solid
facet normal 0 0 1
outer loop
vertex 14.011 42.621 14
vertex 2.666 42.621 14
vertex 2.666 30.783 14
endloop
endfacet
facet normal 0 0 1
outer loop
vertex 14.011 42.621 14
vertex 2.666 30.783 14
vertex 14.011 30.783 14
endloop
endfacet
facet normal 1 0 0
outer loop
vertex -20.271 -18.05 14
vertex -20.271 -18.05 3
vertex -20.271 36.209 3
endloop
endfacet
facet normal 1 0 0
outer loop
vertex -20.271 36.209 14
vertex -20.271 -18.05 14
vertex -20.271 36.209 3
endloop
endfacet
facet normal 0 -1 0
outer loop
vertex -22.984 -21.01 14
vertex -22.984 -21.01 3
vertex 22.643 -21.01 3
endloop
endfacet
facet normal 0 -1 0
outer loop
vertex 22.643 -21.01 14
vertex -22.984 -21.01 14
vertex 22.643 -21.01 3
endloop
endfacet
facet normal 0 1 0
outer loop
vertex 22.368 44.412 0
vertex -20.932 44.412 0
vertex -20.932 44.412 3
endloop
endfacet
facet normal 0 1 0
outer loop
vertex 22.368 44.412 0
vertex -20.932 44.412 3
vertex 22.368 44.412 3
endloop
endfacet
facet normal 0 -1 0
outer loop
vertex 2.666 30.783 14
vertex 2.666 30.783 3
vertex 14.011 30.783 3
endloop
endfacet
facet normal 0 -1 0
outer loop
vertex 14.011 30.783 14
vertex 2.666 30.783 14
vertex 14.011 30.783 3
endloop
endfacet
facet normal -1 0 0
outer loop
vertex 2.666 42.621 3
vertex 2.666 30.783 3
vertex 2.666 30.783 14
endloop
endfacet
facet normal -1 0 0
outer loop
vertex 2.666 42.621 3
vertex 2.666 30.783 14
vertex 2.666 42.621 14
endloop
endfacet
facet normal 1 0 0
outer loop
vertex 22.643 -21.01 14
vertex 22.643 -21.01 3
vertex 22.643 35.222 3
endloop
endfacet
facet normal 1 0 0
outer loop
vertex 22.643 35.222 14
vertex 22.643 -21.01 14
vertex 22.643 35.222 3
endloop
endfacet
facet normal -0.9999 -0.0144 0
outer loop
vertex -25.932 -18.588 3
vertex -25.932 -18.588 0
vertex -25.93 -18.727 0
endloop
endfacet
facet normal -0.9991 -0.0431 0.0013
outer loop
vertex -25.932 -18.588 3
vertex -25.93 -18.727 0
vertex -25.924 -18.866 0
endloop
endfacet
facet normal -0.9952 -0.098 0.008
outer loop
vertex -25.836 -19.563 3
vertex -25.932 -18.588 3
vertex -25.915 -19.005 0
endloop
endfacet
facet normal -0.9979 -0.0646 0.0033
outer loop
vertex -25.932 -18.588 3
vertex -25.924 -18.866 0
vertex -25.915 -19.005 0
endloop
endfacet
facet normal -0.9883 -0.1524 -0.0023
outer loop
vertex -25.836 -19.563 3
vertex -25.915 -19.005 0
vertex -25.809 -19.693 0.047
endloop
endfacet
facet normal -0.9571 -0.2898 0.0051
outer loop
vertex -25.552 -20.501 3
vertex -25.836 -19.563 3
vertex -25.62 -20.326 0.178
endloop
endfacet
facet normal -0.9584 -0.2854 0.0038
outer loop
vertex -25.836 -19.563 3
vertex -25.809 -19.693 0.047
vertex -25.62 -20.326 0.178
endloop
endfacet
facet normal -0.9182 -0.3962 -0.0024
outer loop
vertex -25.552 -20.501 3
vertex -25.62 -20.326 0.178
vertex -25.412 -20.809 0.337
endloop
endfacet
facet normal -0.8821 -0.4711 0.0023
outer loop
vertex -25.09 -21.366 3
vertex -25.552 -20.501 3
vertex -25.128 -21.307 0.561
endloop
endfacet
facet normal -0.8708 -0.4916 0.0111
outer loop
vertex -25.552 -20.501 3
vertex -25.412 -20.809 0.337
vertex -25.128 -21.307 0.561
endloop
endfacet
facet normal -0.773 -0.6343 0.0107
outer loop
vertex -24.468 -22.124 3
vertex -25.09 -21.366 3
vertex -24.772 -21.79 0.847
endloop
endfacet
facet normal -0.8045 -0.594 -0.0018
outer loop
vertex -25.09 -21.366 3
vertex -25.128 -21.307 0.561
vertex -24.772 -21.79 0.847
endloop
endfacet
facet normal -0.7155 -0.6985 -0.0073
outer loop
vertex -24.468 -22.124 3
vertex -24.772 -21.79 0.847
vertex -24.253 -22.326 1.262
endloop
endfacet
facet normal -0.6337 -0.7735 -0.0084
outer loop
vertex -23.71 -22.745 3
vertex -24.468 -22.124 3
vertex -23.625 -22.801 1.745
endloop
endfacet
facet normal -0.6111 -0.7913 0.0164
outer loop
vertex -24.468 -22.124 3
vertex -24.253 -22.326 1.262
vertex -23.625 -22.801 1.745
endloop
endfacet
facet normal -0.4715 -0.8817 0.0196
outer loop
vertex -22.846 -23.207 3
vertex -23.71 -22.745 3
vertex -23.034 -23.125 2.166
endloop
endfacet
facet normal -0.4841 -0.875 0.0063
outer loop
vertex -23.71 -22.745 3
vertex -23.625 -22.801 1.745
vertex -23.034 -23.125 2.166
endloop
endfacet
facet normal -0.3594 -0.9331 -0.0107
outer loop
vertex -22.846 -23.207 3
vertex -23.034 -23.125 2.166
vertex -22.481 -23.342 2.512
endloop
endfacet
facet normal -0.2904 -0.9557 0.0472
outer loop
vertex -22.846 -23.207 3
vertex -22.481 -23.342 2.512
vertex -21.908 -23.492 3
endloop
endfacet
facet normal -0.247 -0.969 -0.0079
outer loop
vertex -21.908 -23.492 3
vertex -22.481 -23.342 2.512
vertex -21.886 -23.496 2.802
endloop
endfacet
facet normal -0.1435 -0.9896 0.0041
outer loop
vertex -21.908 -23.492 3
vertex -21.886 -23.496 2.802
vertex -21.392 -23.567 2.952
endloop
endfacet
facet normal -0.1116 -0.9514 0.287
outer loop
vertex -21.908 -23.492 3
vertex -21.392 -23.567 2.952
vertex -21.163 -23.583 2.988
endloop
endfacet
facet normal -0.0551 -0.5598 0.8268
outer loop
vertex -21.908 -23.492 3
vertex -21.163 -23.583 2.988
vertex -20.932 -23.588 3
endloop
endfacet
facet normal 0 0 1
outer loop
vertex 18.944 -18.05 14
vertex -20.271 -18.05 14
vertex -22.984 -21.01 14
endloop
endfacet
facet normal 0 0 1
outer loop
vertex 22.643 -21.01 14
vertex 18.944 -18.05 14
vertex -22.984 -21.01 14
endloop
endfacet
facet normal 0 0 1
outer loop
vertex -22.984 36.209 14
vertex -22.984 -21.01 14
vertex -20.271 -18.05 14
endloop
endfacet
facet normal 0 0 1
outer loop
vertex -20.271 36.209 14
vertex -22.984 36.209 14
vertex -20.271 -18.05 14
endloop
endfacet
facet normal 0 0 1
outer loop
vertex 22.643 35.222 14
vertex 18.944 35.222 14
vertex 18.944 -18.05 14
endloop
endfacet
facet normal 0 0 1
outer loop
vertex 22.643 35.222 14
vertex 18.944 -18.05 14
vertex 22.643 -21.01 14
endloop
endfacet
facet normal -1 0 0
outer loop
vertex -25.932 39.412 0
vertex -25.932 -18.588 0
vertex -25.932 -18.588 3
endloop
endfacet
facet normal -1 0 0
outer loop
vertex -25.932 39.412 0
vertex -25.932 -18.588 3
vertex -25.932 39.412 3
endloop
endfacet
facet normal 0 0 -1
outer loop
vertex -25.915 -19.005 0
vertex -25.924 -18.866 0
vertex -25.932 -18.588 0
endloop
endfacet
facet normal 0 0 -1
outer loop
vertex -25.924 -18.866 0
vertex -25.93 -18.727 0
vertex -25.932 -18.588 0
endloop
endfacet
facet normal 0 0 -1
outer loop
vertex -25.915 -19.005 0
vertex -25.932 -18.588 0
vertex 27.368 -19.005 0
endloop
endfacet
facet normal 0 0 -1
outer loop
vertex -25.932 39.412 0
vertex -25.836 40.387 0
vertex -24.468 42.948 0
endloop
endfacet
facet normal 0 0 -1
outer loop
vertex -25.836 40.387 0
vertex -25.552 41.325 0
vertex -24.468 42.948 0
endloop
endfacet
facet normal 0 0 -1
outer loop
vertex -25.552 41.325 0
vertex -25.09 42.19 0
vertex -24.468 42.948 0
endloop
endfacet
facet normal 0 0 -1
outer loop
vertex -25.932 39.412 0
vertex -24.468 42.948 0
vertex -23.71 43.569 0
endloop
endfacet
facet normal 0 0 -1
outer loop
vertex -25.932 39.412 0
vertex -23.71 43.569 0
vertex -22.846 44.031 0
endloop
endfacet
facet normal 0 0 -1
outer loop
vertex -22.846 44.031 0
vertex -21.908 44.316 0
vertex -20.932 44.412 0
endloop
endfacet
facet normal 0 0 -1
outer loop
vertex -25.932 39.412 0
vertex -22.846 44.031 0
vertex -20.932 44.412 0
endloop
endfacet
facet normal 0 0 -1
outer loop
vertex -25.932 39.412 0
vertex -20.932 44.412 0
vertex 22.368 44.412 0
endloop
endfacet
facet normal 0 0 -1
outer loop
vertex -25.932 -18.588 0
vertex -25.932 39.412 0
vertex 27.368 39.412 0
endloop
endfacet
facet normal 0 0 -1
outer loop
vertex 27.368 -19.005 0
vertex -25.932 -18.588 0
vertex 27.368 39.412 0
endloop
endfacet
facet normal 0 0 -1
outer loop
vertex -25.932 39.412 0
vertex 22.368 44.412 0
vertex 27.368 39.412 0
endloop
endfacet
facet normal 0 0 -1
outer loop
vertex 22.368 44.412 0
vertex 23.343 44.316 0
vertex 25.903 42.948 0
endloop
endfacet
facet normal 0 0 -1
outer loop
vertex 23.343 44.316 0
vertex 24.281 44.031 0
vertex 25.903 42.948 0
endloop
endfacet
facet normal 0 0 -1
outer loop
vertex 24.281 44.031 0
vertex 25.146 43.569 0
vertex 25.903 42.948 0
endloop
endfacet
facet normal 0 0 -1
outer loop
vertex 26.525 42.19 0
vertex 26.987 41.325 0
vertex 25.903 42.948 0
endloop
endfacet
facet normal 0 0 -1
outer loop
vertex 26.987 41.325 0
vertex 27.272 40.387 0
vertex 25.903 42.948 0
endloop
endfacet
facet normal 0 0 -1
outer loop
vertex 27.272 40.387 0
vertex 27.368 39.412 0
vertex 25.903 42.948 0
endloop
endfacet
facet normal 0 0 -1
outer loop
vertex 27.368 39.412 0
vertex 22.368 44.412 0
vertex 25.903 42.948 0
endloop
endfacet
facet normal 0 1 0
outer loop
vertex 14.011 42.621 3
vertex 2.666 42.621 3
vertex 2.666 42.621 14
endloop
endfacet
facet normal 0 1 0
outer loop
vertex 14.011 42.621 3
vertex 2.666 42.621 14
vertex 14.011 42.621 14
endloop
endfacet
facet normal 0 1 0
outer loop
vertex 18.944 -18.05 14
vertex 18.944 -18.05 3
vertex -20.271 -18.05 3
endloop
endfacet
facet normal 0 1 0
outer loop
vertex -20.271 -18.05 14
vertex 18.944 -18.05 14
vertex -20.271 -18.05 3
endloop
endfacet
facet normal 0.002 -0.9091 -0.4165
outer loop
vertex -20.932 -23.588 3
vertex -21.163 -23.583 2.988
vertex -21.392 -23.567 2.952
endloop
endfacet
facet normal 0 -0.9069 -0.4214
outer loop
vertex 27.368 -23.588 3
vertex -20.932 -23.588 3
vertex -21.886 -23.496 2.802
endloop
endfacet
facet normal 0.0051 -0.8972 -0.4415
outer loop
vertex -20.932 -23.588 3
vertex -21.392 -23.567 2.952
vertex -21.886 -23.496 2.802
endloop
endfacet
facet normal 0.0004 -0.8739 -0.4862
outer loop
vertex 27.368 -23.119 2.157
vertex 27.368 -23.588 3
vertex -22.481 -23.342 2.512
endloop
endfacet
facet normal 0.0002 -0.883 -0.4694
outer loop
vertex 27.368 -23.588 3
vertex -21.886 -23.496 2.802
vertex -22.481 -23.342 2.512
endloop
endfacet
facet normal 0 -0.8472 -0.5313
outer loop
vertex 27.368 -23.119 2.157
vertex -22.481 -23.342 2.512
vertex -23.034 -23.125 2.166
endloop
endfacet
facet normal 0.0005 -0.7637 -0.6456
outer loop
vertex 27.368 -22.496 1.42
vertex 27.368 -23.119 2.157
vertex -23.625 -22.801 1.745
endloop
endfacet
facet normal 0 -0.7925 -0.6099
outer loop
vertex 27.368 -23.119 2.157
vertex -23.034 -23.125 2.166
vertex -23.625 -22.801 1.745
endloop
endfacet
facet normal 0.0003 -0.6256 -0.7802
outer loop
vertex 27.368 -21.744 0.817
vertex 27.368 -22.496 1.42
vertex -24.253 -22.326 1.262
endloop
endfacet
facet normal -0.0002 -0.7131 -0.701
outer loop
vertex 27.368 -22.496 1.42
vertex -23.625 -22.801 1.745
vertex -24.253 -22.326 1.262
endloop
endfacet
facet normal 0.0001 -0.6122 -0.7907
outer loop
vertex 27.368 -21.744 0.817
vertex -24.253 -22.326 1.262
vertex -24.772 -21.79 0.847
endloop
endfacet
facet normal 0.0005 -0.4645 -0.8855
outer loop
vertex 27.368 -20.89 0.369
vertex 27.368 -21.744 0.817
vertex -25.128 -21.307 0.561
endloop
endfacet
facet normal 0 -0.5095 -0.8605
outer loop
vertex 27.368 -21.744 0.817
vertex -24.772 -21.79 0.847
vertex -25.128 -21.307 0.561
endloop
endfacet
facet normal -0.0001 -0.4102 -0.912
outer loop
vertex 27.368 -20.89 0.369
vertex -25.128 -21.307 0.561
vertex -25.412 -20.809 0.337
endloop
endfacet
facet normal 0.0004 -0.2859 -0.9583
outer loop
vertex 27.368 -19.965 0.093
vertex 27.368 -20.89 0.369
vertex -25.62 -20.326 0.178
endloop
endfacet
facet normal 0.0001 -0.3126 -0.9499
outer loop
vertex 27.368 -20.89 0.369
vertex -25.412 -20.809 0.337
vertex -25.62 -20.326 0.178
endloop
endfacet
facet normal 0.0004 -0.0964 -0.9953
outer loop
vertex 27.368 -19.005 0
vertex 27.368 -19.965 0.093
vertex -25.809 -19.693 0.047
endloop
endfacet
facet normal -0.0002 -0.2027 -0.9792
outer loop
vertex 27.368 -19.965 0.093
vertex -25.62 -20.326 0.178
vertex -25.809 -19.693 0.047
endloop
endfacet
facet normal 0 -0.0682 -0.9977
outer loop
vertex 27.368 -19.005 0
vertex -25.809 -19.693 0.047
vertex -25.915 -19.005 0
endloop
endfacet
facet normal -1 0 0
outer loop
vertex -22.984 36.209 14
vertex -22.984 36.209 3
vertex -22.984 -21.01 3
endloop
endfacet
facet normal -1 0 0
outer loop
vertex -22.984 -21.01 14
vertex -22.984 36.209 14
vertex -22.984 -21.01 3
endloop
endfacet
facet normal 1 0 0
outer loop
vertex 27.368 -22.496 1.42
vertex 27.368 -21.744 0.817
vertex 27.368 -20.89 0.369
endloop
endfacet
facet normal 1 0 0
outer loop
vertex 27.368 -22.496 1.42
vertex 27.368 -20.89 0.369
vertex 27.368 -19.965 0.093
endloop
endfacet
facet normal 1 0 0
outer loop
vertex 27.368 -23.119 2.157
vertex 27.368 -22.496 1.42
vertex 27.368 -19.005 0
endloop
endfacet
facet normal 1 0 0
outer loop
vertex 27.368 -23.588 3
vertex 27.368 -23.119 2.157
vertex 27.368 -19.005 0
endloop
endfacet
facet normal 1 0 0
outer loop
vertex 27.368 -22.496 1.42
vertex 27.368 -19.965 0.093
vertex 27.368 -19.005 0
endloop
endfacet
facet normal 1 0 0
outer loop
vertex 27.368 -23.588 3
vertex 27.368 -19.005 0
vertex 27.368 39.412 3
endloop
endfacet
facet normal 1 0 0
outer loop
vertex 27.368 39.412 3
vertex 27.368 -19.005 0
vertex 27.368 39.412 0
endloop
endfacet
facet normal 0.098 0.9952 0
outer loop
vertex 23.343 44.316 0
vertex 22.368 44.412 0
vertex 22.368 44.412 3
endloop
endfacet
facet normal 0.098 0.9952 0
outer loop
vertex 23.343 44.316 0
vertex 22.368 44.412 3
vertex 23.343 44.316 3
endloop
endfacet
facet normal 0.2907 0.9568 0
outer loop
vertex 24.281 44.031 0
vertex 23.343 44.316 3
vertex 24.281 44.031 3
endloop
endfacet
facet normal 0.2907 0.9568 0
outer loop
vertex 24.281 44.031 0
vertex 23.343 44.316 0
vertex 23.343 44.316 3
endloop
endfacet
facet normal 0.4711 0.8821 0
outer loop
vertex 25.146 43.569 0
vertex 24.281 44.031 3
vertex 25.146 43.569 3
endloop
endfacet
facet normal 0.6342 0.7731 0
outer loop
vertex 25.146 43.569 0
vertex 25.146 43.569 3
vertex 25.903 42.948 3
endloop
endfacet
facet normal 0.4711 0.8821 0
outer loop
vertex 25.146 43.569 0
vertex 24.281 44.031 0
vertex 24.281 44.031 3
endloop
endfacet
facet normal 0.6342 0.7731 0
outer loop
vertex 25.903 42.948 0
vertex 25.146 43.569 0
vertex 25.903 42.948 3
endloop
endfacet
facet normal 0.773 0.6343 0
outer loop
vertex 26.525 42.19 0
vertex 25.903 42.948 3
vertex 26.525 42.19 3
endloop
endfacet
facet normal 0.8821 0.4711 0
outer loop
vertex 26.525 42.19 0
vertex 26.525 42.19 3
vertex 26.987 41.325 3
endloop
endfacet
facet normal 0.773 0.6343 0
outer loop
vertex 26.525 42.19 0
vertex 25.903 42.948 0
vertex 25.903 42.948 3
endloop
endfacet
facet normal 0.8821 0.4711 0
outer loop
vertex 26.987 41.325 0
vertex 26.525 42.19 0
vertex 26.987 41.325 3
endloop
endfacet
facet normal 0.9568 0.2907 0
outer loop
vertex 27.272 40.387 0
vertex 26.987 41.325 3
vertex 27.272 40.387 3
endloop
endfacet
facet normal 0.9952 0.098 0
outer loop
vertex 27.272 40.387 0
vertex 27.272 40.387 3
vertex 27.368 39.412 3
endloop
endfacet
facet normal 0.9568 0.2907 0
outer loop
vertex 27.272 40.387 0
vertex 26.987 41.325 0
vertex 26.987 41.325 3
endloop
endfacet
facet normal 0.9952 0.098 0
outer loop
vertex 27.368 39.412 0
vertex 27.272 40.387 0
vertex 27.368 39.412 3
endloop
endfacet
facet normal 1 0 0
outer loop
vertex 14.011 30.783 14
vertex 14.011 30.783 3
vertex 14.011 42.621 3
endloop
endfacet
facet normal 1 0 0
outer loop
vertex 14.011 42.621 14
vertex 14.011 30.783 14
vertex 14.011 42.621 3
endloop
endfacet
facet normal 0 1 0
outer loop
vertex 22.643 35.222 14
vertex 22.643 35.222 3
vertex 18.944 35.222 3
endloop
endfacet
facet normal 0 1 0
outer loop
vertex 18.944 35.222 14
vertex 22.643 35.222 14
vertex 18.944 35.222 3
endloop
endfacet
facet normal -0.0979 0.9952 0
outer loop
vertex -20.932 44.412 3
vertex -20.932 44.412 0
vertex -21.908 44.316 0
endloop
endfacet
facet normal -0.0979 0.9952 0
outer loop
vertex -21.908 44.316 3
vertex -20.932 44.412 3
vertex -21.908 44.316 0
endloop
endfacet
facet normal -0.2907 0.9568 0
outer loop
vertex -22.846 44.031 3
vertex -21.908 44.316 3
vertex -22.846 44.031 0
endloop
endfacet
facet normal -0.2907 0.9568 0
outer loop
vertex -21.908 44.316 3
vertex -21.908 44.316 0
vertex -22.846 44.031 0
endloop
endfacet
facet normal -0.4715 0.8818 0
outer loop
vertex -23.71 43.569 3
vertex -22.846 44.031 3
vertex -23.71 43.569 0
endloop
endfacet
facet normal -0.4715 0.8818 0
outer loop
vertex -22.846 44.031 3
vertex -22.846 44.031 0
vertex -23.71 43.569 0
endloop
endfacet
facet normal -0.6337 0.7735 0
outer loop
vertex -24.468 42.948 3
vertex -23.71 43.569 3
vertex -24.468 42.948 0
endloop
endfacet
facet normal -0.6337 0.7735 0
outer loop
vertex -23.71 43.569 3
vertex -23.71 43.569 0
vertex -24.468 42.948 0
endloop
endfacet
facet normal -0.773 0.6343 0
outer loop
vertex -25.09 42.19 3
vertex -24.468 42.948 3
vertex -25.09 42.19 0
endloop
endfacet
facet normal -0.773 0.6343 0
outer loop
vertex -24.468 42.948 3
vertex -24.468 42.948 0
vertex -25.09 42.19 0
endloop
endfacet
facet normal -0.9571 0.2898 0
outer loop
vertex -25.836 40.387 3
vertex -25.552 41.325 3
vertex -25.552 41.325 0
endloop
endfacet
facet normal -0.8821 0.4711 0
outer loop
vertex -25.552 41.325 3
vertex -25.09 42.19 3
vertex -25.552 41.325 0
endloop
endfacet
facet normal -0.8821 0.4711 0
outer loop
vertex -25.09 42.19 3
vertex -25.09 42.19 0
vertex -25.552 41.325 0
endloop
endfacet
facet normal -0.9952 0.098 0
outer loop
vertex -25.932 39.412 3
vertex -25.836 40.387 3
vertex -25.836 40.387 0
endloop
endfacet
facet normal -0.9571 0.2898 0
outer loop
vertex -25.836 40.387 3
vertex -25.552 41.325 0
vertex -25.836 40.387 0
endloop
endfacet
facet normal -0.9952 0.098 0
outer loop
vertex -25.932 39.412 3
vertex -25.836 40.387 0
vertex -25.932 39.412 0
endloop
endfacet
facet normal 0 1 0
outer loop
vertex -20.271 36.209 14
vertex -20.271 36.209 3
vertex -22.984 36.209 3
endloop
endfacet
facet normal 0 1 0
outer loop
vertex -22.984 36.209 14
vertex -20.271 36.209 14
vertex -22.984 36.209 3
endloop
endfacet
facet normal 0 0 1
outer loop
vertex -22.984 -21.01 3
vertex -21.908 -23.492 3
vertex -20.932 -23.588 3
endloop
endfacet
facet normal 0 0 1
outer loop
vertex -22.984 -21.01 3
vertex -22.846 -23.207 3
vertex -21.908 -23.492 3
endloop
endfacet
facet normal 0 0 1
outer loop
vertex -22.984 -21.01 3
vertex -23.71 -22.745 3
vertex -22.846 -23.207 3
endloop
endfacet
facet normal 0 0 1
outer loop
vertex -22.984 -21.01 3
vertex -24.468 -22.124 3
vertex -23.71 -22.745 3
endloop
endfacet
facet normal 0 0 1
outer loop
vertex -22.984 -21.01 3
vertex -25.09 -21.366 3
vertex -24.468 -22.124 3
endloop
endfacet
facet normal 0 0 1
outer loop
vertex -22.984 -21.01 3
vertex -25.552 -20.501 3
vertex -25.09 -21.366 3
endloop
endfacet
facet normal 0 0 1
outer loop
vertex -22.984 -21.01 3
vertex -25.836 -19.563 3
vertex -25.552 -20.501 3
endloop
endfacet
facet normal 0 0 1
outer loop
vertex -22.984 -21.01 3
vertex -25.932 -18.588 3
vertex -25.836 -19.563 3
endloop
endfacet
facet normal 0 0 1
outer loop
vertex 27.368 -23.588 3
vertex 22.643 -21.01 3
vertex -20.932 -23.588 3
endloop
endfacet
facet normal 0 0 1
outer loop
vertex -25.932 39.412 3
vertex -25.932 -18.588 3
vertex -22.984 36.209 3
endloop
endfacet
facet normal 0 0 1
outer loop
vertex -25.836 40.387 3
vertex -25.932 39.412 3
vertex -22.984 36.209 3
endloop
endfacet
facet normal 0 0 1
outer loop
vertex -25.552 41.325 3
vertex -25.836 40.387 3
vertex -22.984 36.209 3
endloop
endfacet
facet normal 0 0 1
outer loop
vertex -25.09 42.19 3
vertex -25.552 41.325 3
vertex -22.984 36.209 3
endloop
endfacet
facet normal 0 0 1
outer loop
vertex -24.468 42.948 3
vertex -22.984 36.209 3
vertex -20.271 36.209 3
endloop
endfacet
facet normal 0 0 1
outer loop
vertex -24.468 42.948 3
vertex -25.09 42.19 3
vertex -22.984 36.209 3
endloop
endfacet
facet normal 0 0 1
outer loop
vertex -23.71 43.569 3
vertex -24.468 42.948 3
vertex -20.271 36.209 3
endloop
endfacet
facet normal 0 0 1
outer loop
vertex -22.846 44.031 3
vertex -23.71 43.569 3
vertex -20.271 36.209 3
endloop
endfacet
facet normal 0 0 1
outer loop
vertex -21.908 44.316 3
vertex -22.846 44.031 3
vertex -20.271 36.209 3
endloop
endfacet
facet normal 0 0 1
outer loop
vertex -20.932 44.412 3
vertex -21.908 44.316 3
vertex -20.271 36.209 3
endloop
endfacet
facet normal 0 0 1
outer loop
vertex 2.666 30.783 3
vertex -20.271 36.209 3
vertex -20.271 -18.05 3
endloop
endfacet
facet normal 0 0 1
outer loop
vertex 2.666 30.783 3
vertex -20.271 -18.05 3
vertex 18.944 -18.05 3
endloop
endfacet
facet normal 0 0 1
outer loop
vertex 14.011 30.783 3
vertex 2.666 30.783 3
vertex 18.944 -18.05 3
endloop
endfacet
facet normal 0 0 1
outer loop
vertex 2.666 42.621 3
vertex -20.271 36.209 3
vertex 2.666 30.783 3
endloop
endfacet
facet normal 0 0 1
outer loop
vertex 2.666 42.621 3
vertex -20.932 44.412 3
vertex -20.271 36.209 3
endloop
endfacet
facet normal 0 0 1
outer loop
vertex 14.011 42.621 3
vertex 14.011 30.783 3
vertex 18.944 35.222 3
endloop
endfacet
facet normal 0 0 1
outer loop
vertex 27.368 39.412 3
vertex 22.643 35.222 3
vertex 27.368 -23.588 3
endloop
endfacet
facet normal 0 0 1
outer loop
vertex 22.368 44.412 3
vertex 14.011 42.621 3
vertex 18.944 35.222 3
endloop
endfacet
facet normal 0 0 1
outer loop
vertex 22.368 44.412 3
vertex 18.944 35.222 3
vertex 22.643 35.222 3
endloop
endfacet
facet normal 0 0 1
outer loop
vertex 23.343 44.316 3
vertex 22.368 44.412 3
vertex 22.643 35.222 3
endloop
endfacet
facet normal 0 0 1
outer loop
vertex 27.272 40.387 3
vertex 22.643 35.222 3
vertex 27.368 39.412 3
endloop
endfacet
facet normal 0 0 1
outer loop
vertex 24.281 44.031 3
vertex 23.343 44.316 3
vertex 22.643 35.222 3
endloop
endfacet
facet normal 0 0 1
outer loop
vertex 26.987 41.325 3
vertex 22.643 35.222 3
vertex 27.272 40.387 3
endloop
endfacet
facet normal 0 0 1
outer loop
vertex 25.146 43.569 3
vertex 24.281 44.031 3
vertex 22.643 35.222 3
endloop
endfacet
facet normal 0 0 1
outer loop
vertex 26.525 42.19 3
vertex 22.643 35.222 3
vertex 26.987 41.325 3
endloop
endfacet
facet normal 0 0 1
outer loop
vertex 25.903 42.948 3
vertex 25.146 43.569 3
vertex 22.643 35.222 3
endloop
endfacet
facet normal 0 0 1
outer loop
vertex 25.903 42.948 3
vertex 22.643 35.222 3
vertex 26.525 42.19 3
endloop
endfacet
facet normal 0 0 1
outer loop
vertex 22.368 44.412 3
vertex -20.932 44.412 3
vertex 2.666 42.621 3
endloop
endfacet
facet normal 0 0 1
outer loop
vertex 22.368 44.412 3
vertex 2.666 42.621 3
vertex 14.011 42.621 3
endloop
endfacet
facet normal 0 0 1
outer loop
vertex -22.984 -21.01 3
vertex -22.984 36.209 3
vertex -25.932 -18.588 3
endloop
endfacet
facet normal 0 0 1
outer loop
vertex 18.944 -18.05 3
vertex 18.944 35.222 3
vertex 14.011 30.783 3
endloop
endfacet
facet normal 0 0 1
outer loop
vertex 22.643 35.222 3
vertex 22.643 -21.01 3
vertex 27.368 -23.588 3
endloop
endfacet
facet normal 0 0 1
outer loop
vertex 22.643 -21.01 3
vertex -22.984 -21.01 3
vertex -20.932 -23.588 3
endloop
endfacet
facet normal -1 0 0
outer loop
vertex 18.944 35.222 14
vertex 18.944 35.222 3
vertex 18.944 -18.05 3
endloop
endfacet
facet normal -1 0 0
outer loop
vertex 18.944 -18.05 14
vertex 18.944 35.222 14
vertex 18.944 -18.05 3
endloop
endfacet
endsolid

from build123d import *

# Parameters (mm, degrees)
F1_DEPTH    = 14
F0_W        = 11.3450561184
F0_H        = 11.8383169174
F0_W_2      = 53.3
F0_H_2      = 68
F2_DEPTH    = 3
F3_T1_DEPTH = 28
F3_T3_DEPTH = 76.2128784748


# Not quite as in the source:
# - a fillet or chamfer that OpenCascade refuses, or shapes differently, is made with other operations: its cross-section is extruded or revolved along the edge and cut away or added


with BuildPart() as f1:
    # F0 (on Top) → F1 (new body)
    with BuildSketch(Plane.XY):
        Polygon((-20.2707853168, 36.2087599933), (-22.9837335646, 36.2087599933), (-22.9837335646, -18.0502012372), (-22.9837335646, -21.0097823292), (-20.2707853168, -21.0097823292), (18.9436431974, -21.0097823292), (22.6431209594, -21.0097823292), (22.6431209594, -18.0502012372), (22.6431209594, 35.2222323418), (18.9436431974, 35.2222323418), (18.9436431974, -18.0502012372), (-20.2707853168, -18.0502012372), align=None)
    extrude(amount=F1_DEPTH)



with BuildPart() as f1b:
    # F0 (on Top) → F1, piece 2 (new body)
    with BuildSketch(Plane.XY):
        with Locations((8.338484331, 36.7020219564)):
            Rectangle(F0_W, F0_H)
    extrude(amount=F1_DEPTH)


with BuildPart() as f1_1:
    add(f1.part)

    add(f1b.part)  # F2 merges F1b
    # F0 (on Top) → F2 (join)
    with BuildSketch(Plane.XY):
        with Locations((0.7177972624, 10.4120122269)):
            Rectangle(F0_W_2, F0_H_2)
        Polygon((-22.9837335646, -18.0502012372), (-22.9837335646, 36.2087599933), (-20.2707853168, 36.2087599933), (-20.2707853168, -18.0502012372), (18.9436431974, -18.0502012372), (18.9436431974, 35.2222323418), (22.6431209594, 35.2222323418), (22.6431209594, -18.0502012372), (22.6431209594, -21.0097823292), (18.9436431974, -21.0097823292), (-20.2707853168, -21.0097823292), (-22.9837335646, -21.0097823292), align=None, mode=Mode.SUBTRACT)
        with Locations((8.338484331, 36.7020219564)):
            Rectangle(F0_W, F0_H, mode=Mode.SUBTRACT)
    extrude(amount=F2_DEPTH)

    # F3: fillet of radius 5 on 4 edges, made by hand

    # F3_s2 → F3_t1 (cut)
    with BuildSketch(Plane.XY.offset(-12.5)):
        with BuildLine():
            ThreePointArc((-20.9322027376, 44.4120122269), (-24.4677366436, 42.9475461328), (-25.9322027376, 39.4120122269))
            Line((-25.9322027376, 39.4120122269), (-25.9322027376, 44.4120122269))
            Line((-25.9322027376, 44.4120122269), (-20.9322027376, 44.4120122269))
        make_face()
        with BuildLine():
            ThreePointArc((-25.9322027376, -18.5879877731), (-24.4677366436, -22.1235216791), (-20.9322027376, -23.5879877731))
            Line((-20.9322027376, -23.5879877731), (-25.9322027376, -23.5879877731))
            Line((-25.9322027376, -23.5879877731), (-25.9322027376, -18.5879877731))
        make_face()
        with BuildLine():
            ThreePointArc((22.3677972624, 44.4120122269), (25.9033311683, 42.9475461328), (27.3677972624, 39.4120122269))
            Line((27.3677972624, 39.4120122269), (27.3677972624, 44.4120122269))
            Line((27.3677972624, 44.4120122269), (22.3677972624, 44.4120122269))
        make_face()
    extrude(amount=F3_T1_DEPTH, mode=Mode.SUBTRACT)

    # F3_s4 → F3_t3 (cut)
    with BuildSketch(Plane.YZ.offset(-37.388641975)):
        with BuildLine():
            ThreePointArc((-23.5879877731, 3), (-21.7440248657, 0.8166998673), (-19.0054120782, 0))
            Line((-19.0054120782, 0), (-23.5879877731, 0))
            Line((-23.5879877731, 0), (-23.5879877731, 3))
        make_face()
    extrude(amount=F3_T3_DEPTH, mode=Mode.SUBTRACT)


solid = f1_1.part
